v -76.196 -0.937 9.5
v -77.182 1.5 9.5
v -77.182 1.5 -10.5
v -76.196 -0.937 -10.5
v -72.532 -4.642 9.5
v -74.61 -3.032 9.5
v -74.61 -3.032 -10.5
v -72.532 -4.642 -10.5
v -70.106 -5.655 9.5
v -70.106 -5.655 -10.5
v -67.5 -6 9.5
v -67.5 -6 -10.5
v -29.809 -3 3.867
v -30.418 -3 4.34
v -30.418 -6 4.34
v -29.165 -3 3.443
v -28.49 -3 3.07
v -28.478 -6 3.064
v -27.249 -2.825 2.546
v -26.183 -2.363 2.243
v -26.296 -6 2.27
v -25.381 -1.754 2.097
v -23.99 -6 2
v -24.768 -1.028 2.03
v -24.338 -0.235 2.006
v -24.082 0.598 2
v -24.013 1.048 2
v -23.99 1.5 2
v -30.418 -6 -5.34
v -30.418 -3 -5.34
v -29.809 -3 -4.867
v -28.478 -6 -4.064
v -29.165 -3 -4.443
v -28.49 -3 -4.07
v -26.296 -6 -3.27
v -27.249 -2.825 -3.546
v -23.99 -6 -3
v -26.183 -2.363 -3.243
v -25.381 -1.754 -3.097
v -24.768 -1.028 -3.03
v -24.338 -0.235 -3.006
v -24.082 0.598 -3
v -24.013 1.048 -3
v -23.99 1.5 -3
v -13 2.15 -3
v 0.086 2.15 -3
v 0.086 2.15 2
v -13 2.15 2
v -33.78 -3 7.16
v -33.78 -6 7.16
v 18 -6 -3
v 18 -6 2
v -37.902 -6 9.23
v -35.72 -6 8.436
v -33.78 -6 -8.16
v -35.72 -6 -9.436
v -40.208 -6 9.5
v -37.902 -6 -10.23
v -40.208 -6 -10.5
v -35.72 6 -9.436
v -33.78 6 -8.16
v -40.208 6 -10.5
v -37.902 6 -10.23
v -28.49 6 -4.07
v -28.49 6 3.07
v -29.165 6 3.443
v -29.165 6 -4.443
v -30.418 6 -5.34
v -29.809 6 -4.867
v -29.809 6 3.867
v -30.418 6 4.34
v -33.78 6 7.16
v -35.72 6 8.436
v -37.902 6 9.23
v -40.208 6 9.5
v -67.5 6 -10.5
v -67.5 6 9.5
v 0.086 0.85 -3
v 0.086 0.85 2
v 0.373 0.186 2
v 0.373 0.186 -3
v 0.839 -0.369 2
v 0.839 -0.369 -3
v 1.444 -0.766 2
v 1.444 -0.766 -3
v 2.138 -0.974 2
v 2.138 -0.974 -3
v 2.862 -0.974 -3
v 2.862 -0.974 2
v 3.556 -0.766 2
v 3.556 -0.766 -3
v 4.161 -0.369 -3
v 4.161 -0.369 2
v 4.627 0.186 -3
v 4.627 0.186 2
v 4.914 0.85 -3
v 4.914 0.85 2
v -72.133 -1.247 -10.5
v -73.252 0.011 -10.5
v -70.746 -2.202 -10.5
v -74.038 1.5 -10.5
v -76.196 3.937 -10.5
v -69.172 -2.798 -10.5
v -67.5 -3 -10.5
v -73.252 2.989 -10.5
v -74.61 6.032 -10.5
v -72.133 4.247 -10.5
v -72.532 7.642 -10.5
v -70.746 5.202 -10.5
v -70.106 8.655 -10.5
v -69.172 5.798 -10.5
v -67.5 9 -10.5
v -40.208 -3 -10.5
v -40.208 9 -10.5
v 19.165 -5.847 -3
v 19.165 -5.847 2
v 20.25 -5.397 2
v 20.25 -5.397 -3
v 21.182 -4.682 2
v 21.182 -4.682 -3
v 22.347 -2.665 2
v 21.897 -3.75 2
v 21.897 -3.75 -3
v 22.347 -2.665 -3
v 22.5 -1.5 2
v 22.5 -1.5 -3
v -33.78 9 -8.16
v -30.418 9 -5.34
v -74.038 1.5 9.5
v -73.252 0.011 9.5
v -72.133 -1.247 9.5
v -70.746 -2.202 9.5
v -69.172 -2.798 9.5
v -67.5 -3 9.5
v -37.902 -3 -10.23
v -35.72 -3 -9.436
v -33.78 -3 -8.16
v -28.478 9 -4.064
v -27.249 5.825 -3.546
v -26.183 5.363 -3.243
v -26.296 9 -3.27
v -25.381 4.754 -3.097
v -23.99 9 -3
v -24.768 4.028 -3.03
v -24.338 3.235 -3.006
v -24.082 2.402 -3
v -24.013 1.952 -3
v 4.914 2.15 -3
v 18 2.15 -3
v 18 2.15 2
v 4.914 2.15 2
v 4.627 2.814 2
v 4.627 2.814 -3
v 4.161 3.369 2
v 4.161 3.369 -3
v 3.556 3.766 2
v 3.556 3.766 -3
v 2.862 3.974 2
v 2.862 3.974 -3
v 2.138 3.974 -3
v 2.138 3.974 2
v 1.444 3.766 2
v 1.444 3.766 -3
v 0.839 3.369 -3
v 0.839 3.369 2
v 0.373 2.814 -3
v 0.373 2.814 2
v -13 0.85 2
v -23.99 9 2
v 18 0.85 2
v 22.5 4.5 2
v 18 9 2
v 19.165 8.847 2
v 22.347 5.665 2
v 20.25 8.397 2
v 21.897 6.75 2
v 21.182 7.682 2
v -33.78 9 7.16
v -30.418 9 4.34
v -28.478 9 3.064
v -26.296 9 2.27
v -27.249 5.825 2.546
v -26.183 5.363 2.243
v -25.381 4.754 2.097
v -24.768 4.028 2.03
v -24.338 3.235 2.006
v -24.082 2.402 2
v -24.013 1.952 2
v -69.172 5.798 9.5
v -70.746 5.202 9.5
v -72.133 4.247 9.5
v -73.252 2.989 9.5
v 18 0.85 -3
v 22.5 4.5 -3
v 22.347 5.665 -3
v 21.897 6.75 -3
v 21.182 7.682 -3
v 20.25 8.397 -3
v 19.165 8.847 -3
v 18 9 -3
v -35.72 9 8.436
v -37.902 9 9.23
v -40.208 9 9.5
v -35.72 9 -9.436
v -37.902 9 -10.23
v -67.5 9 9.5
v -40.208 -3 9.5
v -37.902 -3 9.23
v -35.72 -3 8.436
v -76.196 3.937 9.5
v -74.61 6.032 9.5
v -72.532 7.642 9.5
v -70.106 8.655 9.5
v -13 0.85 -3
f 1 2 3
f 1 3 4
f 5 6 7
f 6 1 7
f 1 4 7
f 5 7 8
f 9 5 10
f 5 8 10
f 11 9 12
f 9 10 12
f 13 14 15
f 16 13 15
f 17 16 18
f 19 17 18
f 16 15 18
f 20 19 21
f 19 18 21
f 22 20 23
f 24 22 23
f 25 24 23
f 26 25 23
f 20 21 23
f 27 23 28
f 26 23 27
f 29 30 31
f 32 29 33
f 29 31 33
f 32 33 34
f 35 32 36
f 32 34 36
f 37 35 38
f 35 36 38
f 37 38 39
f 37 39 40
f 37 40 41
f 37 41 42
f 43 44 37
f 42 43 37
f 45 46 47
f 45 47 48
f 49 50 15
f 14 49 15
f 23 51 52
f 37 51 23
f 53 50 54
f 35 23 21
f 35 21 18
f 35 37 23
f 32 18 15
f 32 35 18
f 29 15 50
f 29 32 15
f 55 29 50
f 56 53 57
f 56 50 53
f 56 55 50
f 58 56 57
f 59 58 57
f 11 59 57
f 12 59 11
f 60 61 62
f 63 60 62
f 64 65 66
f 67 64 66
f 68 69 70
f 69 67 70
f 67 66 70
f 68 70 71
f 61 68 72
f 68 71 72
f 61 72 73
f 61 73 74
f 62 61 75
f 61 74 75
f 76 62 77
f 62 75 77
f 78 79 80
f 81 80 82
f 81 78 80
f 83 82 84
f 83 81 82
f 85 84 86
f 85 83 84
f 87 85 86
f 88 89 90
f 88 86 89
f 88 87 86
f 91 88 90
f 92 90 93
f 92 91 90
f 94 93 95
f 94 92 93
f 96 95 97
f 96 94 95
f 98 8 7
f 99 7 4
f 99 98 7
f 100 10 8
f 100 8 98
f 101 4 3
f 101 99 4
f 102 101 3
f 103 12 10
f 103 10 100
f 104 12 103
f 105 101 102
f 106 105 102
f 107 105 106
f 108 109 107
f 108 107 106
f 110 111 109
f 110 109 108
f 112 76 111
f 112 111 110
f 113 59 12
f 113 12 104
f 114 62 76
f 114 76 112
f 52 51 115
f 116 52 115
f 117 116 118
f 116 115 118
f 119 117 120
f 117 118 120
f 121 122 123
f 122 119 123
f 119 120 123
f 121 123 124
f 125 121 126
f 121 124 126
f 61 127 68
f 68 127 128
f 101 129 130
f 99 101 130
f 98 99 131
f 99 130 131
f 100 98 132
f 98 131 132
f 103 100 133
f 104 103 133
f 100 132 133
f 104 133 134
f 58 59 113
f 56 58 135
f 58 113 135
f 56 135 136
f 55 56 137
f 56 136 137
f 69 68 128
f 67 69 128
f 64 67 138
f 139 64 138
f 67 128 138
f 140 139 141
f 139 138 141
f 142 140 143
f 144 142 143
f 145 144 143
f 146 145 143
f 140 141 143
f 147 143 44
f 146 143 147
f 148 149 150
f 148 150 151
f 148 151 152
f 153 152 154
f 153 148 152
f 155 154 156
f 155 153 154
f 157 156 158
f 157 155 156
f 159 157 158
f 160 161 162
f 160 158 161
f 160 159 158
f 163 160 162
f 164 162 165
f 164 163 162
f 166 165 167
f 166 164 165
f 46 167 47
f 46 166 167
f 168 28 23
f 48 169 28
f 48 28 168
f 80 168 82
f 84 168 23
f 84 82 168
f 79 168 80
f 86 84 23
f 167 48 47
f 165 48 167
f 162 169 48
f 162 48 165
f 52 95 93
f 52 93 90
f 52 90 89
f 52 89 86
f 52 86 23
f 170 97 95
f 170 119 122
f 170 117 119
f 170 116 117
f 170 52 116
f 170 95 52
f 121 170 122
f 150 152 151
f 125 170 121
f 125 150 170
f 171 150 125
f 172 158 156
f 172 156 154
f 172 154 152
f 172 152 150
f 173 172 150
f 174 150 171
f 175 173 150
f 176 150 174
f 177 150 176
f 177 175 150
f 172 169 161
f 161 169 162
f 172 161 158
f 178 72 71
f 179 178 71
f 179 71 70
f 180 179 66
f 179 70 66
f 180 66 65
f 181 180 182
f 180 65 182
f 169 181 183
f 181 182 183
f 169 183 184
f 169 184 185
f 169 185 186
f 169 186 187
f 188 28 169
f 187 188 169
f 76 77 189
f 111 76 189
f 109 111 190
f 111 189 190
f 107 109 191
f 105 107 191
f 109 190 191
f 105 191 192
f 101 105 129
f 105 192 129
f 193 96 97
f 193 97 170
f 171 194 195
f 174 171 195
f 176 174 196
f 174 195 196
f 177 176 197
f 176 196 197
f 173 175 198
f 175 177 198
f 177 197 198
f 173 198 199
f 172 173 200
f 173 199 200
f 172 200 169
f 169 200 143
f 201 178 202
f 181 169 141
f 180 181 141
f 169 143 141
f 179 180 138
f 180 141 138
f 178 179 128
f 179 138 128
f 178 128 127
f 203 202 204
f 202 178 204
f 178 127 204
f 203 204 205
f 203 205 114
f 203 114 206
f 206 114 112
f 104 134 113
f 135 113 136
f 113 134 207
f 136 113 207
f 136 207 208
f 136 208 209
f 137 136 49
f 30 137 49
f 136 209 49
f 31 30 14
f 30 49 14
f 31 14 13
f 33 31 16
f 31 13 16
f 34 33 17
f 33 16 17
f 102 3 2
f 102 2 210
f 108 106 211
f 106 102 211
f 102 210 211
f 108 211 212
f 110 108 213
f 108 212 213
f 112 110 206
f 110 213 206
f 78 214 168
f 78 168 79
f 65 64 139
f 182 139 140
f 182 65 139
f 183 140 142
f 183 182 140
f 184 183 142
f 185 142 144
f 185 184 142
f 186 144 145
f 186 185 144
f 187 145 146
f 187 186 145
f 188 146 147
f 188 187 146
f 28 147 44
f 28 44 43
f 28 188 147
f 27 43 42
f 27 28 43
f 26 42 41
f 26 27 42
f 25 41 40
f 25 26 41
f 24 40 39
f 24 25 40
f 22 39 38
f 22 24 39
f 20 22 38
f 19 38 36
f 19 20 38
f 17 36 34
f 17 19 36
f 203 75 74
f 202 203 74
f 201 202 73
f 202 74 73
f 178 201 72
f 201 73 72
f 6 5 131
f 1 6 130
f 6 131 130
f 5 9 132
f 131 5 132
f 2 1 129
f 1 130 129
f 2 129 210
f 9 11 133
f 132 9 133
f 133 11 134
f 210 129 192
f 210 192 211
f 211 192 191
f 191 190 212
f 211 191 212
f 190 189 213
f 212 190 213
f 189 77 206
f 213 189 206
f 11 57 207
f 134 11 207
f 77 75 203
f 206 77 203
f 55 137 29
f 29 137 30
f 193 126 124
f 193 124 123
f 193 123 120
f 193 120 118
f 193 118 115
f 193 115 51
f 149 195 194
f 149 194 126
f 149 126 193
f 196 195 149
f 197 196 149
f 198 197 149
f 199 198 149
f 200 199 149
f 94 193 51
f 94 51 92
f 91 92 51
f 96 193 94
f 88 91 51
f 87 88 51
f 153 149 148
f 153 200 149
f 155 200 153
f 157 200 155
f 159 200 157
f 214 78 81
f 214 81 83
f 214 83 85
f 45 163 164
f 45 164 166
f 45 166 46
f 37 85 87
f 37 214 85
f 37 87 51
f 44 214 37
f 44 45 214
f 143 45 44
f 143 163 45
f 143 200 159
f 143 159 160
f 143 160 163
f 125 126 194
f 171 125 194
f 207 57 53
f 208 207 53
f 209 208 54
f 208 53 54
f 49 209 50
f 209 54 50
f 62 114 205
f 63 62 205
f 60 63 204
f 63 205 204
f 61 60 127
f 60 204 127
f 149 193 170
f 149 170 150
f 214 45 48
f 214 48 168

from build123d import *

# Parameters (mm, degrees)
ESBO_O1_W                         = 40
ESBO_O1_H                         = 15
RESSALTO_EXTRUS_O1_DEPTH          = 3
ESBO_O3_W                         = 40
ESBO_O3_H                         = 15
RESSALTO_EXTRUS_O2_DEPTH          = 2
CORTE_EXTRUS_O1_REACH             = 26.418
CORTE_EXTRUS_O1_DIRECTION_2_REACH = 26.418
ESBO_O5_W                         = 20
ESBO_O5_H                         = 15
RESSALTO_EXTRUS_O4_DEPTH          = 60
CHANFRO1_SIZE                     = 19.068057482
CHANFRO1_SIZE_2                   = 16
FILETE4_R                         = 10
CORTE_EXTRUS_O2_DEPTH             = 81.237970309
FILETE5_R                         = 4.5


with BuildPart() as part:
    # Esboço1 → Ressalto-extrusão1 (new body)
    with BuildSketch(Plane.XY):
        with Locations((2.5, 1.5)):
            Rectangle(ESBO_O1_W, ESBO_O1_H)
    extrude(amount=-RESSALTO_EXTRUS_O1_DEPTH)

    # Esboço3 → Ressalto-extrusão2 (add)
    with BuildSketch(Plane.XY):
        with Locations((2.5, 1.5)):
            Rectangle(ESBO_O3_W, ESBO_O3_H)
    extrude(amount=RESSALTO_EXTRUS_O2_DEPTH)

    # Corte-extrusão1: up to this face of the body (flat: up to its plane)
    corte_extrus_o1_end = Plane(part.part.faces().sort_by_distance((2.5, 1.5, 2))[0])
    # Esboço2 → Corte-extrusão1 (cut, up to the picked face)
    with BuildSketch(Plane.XY, mode=Mode.PRIVATE) as corte_extrus_o1_sk1:
        with BuildLine():
            Line((0.085978459, 2.15), (-13, 2.15))
            Line((-13, 2.15), (-13, 0.85))
            Line((-13, 0.85), (0.085978459, 0.85))
            ThreePointArc((0.085978459, 0.85), (2.5, -1), (4.914021541, 0.85))
            Line((4.914021541, 0.85), (18, 0.85))
            Line((18, 0.85), (18, 2.15))
            Line((18, 2.15), (4.914021541, 2.15))
            ThreePointArc((4.914021541, 2.15), (2.5, 4), (0.085978459, 2.15))
        make_face()
    corte_extrus_o1_tool1 = split(extrude(corte_extrus_o1_sk1.sketch, amount=CORTE_EXTRUS_O1_REACH, mode=Mode.PRIVATE), bisect_by=corte_extrus_o1_end, keep=Keep.BOTH, mode=Mode.PRIVATE)
    add(corte_extrus_o1_tool1.solids().sort_by(Axis((2.5, 1.5, 0), (0, 0, 1)))[0], mode=Mode.SUBTRACT)

    # Corte-extrusão1 direction 2: up to this face of the body (flat: up to its plane)
    corte_extrus_o1_direction_2_end = Plane(part.part.faces().sort_by_distance((2.5, 1.5, -3))[0])
    # Esboço2 → Corte-extrusão1 direction 2 (cut, up to the picked face)
    with BuildSketch(Plane.XY, mode=Mode.PRIVATE) as corte_extrus_o1_direction_2_sk1:
        with BuildLine():
            Line((0.085978459, 2.15), (-13, 2.15))
            Line((-13, 2.15), (-13, 0.85))
            Line((-13, 0.85), (0.085978459, 0.85))
            ThreePointArc((0.085978459, 0.85), (2.5, -1), (4.914021541, 0.85))
            Line((4.914021541, 0.85), (18, 0.85))
            Line((18, 0.85), (18, 2.15))
            Line((18, 2.15), (4.914021541, 2.15))
            ThreePointArc((4.914021541, 2.15), (2.5, 4), (0.085978459, 2.15))
        make_face()
    corte_extrus_o1_direction_2_tool1 = split(extrude(corte_extrus_o1_direction_2_sk1.sketch, amount=-CORTE_EXTRUS_O1_DIRECTION_2_REACH, mode=Mode.PRIVATE), bisect_by=corte_extrus_o1_direction_2_end, keep=Keep.BOTH, mode=Mode.PRIVATE)
    add(corte_extrus_o1_direction_2_tool1.solids().sort_by(Axis((2.5, 1.5, 0), (0, 0, -1)))[0], mode=Mode.SUBTRACT)

    # Esboço5 → Ressalto-extrusão4 (add)
    with BuildSketch(Plane.ZY.offset(17.5)):
        with Locations((-0.5, 1.5)):
            Rectangle(ESBO_O5_W, ESBO_O5_H)
    extrude(amount=RESSALTO_EXTRUS_O4_DEPTH)

    # Chanfro1
    # the kernel refuses this chamfer: 19.068057482, 16 mm, written as the material it takes off along each edge
    with BuildSketch(Plane(origin=(-17.5, -55.146127732, 9.5), x_dir=(-0.9996889667359941, 0, 0.024939322090234247), z_dir=(0, 1, 0))) as chanfro1_piece_1_section:
        Polygon((CHANFRO1_SIZE * 0.99968896671, -CHANFRO1_SIZE * 0.0249393220896), (-CHANFRO1_SIZE_2 * 0.0249393220902, -CHANFRO1_SIZE_2 * 0.999688966736), (0, 0), align=None)
    chanfro1_piece_1 = extrude(amount=113.292255464, mode=Mode.PRIVATE)
    chanfro1_piece_1 = split(chanfro1_piece_1, bisect_by=Plane(origin=(-25.155035178, 1.5, 2), z_dir=(0, 0, 1)), keep=Keep.TOP, mode=Mode.PRIVATE)
    add(chanfro1_piece_1, mode=Mode.SUBTRACT)
    with BuildSketch(Plane(origin=(-17.5, -55.146127732, 9.5), x_dir=(-0.9996889667359941, 0, 0.024939322090234247), z_dir=(0, 1, 0))) as chanfro1_piece_2_section:
        Polygon((CHANFRO1_SIZE * 0.99968896671, -CHANFRO1_SIZE * 0.0249393220896), (-CHANFRO1_SIZE_2 * 0.0249393220902, -CHANFRO1_SIZE_2 * 0.999688966736), (0, 0), align=None)
    chanfro1_piece_2 = extrude(amount=113.292255464, mode=Mode.PRIVATE)
    chanfro1_piece_2 = split(chanfro1_piece_2, bisect_by=Plane(origin=(-18.373305927, 1.5, -3), z_dir=(0, 0, -1)), keep=Keep.TOP, mode=Mode.PRIVATE)
    add(chanfro1_piece_2, mode=Mode.SUBTRACT)
    with BuildSketch(Plane(origin=(-17.5, 58.146127732, -10.5), x_dir=(-0.9996889667359941, 0, -0.024939322090234247), z_dir=(0, -1, 0))) as chanfro1_piece_3_section:
        Polygon((CHANFRO1_SIZE * 0.99968896671, -CHANFRO1_SIZE * 0.0249393220896), (-CHANFRO1_SIZE_2 * 0.0249393220902, -CHANFRO1_SIZE_2 * 0.999688966736), (0, 0), align=None)
    chanfro1_piece_3 = extrude(amount=113.292255464, mode=Mode.PRIVATE)
    chanfro1_piece_3 = split(chanfro1_piece_3, bisect_by=Plane(origin=(-25.155035178, 1.5, -3), z_dir=(0, 0, -1)), keep=Keep.TOP, mode=Mode.PRIVATE)
    add(chanfro1_piece_3, mode=Mode.SUBTRACT)
    with BuildSketch(Plane(origin=(-17.5, 58.146127732, -10.5), x_dir=(-0.9996889667359941, 0, -0.024939322090234247), z_dir=(0, -1, 0))) as chanfro1_piece_4_section:
        Polygon((CHANFRO1_SIZE * 0.99968896671, -CHANFRO1_SIZE * 0.0249393220896), (-CHANFRO1_SIZE_2 * 0.0249393220902, -CHANFRO1_SIZE_2 * 0.999688966736), (0, 0), align=None)
    chanfro1_piece_4 = extrude(amount=113.292255464, mode=Mode.PRIVATE)
    chanfro1_piece_4 = split(chanfro1_piece_4, bisect_by=Plane(origin=(-18.373305927, 1.5, 2), z_dir=(0, 0, 1)), keep=Keep.TOP, mode=Mode.PRIVATE)
    add(chanfro1_piece_4, mode=Mode.SUBTRACT)

    # Filete4
    # the kernel refuses this fillet: 10 mm, written as the material it adds along each edge
    with BuildSketch(Plane(origin=(-27.629905537, -6, 2), x_dir=(1, 0, 0), z_dir=(0, 1, 0)), Plane(origin=(-27.629905537, 9, -3), x_dir=(1, 0, 0), z_dir=(0, -1, 0))) as filete4_piece_1:
        with BuildLine():
            CenterArc((FILETE4_R * 0.363970234266, -FILETE4_R), FILETE4_R, 90, 40)
            Line((-FILETE4_R * 0.27881737542, -FILETE4_R * 0.233955556881), (0, 0))
            Line((0, 0), (FILETE4_R * 0.363970234266, 0))
        make_face()
    extrude(amount=15)
    # the kernel refuses this fillet: 10 mm, written as the material it takes off along each edge
    with BuildSketch(Plane(origin=(-36.568057482, -15.099255857, 9.5), x_dir=(-1, 0, 0), z_dir=(0, 1, 0))) as filete4_2_piece_1:
        with BuildLine():
            CenterArc((FILETE4_R * 0.363970234266, -FILETE4_R), FILETE4_R, 90, 40)
            Line((-FILETE4_R * 0.27881737542, -FILETE4_R * 0.233955556881), (0, 0))
            Line((0, 0), (FILETE4_R * 0.363970234266, 0))
        make_face()
    extrude(amount=33.198511713, mode=Mode.SUBTRACT)
    with BuildSketch(Plane(origin=(-77.5, 9, 34.5), x_dir=(0, -1, 0), z_dir=(0, 0, -1))) as filete4_2_piece_2:
        with BuildLine():
            CenterArc((FILETE4_R, -FILETE4_R), FILETE4_R, 90, 90)
            Line((0, -FILETE4_R), (0, 0))
            Line((0, 0), (FILETE4_R, 0))
        make_face()
    extrude(amount=70, mode=Mode.SUBTRACT)
    with BuildSketch(Plane(origin=(-77.5, -6, -35.5), x_dir=(1, 0, 0), z_dir=(0, 0, 1))) as filete4_2_piece_3:
        with BuildLine():
            CenterArc((FILETE4_R, FILETE4_R), FILETE4_R, 180, 90)
            Line((0, FILETE4_R), (0, 0))
            Line((0, 0), (FILETE4_R, 0))
        make_face()
    extrude(amount=70, mode=Mode.SUBTRACT)
    with BuildSketch(Plane(origin=(-36.568057482, 18.099255857, -10.5), x_dir=(0.7660444431190706, 0, 0.6427876096864291), z_dir=(0, -1, 0))) as filete4_2_piece_4:
        with BuildLine():
            CenterArc((FILETE4_R * 0.363970234266, FILETE4_R), FILETE4_R, 230, 40)
            Line((-FILETE4_R * 0.27881737542, FILETE4_R * 0.233955556881), (0, 0))
            Line((0, 0), (FILETE4_R * 0.363970234266, 0))
        make_face()
    extrude(amount=33.198511713, mode=Mode.SUBTRACT)

    # Esboço6 → Corte-extrusão2 (cut, through all)
    with BuildSketch(Plane.XY.offset(9.5)):
        with BuildLine():
            Line((-43.207759824, 6), (-67.5, 6))
            ThreePointArc((-67.5, 6), (-71.468626967, 4.766281297), (-74.038348415, 1.5))
            ThreePointArc((-74.038348415, 1.5), (-71.468626967, -1.766281297), (-67.5, -3))
            Line((-67.5, -3), (-43.207759824, -3))
            Line((-43.207759824, -3), (-23.990203194, -3))
            Line((-23.990203194, -3), (-23.990203194, 6))
            Line((-23.990203194, 6), (-43.207759824, 6))
        make_face()
    extrude(amount=-CORTE_EXTRUS_O2_DEPTH, mode=Mode.SUBTRACT)

    # Filete5
    # the kernel refuses this fillet: 4.5 mm, written as the material it adds along each edge
    with BuildSketch(Plane(origin=(-23.990203194, 6, 13.25), x_dir=(0, -1, 0), z_dir=(0, 0, -1))) as filete5_piece_1_section:
        with BuildLine():
            CenterArc((FILETE5_R, FILETE5_R), FILETE5_R, 180, 90)
            Line((0, FILETE5_R), (0, 0))
            Line((0, 0), (FILETE5_R, 0))
        make_face()
    filete5_piece_1 = extrude(amount=27.5, mode=Mode.PRIVATE)
    filete5_piece_1 = filete5_piece_1 - Plane(origin=(-23.990203194, 5.729138272, 12), x_dir=(1, 0, 0), z_dir=(0, -1, 0)) * Cylinder(10, 73, mode=Mode.PRIVATE)
    filete5_piece_1 = filete5_piece_1 - Plane(origin=(-23.990203194, 5.729138272, -13), x_dir=(1, 0, 0), z_dir=(0, 1, 0)) * Cylinder(10, 73, mode=Mode.PRIVATE)
    add(filete5_piece_1)
    with BuildSketch(Plane(origin=(-23.990203194, -3, 13.25), x_dir=(-1, 0, 0), z_dir=(0, 0, -1))) as filete5_piece_2_section:
        with BuildLine():
            CenterArc((FILETE5_R, FILETE5_R), FILETE5_R, 180, 90)
            Line((0, FILETE5_R), (0, 0))
            Line((0, 0), (FILETE5_R, 0))
        make_face()
    filete5_piece_2 = extrude(amount=27.5, mode=Mode.PRIVATE)
    filete5_piece_2 = filete5_piece_2 - Plane(origin=(-23.990203194, -2.729138204, 12), x_dir=(1, 0, 0), z_dir=(0, -1, 0)) * Cylinder(10, 73, mode=Mode.PRIVATE)
    filete5_piece_2 = filete5_piece_2 - Plane(origin=(-23.990203194, -2.729138204, -13), x_dir=(1, 0, 0), z_dir=(0, 1, 0)) * Cylinder(10, 73, mode=Mode.PRIVATE)
    add(filete5_piece_2)
    # the kernel refuses this fillet: 4.5 mm, written as the material it takes off along each edge
    with BuildSketch(Plane(origin=(22.5, 9, -14.25), x_dir=(0, -1, 0), z_dir=(0, 0, 1))) as filete5_2_piece_1:
        with BuildLine():
            CenterArc((FILETE5_R, -FILETE5_R), FILETE5_R, 90, 90)
            Line((0, -FILETE5_R), (0, 0))
            Line((0, 0), (FILETE5_R, 0))
        make_face()
    extrude(amount=27.5, mode=Mode.SUBTRACT)
    with BuildSketch(Plane(origin=(22.5, -6, -14.25), x_dir=(0, 1, 0), z_dir=(0, 0, 1))) as filete5_2_piece_2:
        with BuildLine():
            CenterArc((FILETE5_R, FILETE5_R), FILETE5_R, 180, 90)
            Line((0, FILETE5_R), (0, 0))
            Line((0, 0), (FILETE5_R, 0))
        make_face()
    extrude(amount=27.5, mode=Mode.SUBTRACT)


solid = part.part
